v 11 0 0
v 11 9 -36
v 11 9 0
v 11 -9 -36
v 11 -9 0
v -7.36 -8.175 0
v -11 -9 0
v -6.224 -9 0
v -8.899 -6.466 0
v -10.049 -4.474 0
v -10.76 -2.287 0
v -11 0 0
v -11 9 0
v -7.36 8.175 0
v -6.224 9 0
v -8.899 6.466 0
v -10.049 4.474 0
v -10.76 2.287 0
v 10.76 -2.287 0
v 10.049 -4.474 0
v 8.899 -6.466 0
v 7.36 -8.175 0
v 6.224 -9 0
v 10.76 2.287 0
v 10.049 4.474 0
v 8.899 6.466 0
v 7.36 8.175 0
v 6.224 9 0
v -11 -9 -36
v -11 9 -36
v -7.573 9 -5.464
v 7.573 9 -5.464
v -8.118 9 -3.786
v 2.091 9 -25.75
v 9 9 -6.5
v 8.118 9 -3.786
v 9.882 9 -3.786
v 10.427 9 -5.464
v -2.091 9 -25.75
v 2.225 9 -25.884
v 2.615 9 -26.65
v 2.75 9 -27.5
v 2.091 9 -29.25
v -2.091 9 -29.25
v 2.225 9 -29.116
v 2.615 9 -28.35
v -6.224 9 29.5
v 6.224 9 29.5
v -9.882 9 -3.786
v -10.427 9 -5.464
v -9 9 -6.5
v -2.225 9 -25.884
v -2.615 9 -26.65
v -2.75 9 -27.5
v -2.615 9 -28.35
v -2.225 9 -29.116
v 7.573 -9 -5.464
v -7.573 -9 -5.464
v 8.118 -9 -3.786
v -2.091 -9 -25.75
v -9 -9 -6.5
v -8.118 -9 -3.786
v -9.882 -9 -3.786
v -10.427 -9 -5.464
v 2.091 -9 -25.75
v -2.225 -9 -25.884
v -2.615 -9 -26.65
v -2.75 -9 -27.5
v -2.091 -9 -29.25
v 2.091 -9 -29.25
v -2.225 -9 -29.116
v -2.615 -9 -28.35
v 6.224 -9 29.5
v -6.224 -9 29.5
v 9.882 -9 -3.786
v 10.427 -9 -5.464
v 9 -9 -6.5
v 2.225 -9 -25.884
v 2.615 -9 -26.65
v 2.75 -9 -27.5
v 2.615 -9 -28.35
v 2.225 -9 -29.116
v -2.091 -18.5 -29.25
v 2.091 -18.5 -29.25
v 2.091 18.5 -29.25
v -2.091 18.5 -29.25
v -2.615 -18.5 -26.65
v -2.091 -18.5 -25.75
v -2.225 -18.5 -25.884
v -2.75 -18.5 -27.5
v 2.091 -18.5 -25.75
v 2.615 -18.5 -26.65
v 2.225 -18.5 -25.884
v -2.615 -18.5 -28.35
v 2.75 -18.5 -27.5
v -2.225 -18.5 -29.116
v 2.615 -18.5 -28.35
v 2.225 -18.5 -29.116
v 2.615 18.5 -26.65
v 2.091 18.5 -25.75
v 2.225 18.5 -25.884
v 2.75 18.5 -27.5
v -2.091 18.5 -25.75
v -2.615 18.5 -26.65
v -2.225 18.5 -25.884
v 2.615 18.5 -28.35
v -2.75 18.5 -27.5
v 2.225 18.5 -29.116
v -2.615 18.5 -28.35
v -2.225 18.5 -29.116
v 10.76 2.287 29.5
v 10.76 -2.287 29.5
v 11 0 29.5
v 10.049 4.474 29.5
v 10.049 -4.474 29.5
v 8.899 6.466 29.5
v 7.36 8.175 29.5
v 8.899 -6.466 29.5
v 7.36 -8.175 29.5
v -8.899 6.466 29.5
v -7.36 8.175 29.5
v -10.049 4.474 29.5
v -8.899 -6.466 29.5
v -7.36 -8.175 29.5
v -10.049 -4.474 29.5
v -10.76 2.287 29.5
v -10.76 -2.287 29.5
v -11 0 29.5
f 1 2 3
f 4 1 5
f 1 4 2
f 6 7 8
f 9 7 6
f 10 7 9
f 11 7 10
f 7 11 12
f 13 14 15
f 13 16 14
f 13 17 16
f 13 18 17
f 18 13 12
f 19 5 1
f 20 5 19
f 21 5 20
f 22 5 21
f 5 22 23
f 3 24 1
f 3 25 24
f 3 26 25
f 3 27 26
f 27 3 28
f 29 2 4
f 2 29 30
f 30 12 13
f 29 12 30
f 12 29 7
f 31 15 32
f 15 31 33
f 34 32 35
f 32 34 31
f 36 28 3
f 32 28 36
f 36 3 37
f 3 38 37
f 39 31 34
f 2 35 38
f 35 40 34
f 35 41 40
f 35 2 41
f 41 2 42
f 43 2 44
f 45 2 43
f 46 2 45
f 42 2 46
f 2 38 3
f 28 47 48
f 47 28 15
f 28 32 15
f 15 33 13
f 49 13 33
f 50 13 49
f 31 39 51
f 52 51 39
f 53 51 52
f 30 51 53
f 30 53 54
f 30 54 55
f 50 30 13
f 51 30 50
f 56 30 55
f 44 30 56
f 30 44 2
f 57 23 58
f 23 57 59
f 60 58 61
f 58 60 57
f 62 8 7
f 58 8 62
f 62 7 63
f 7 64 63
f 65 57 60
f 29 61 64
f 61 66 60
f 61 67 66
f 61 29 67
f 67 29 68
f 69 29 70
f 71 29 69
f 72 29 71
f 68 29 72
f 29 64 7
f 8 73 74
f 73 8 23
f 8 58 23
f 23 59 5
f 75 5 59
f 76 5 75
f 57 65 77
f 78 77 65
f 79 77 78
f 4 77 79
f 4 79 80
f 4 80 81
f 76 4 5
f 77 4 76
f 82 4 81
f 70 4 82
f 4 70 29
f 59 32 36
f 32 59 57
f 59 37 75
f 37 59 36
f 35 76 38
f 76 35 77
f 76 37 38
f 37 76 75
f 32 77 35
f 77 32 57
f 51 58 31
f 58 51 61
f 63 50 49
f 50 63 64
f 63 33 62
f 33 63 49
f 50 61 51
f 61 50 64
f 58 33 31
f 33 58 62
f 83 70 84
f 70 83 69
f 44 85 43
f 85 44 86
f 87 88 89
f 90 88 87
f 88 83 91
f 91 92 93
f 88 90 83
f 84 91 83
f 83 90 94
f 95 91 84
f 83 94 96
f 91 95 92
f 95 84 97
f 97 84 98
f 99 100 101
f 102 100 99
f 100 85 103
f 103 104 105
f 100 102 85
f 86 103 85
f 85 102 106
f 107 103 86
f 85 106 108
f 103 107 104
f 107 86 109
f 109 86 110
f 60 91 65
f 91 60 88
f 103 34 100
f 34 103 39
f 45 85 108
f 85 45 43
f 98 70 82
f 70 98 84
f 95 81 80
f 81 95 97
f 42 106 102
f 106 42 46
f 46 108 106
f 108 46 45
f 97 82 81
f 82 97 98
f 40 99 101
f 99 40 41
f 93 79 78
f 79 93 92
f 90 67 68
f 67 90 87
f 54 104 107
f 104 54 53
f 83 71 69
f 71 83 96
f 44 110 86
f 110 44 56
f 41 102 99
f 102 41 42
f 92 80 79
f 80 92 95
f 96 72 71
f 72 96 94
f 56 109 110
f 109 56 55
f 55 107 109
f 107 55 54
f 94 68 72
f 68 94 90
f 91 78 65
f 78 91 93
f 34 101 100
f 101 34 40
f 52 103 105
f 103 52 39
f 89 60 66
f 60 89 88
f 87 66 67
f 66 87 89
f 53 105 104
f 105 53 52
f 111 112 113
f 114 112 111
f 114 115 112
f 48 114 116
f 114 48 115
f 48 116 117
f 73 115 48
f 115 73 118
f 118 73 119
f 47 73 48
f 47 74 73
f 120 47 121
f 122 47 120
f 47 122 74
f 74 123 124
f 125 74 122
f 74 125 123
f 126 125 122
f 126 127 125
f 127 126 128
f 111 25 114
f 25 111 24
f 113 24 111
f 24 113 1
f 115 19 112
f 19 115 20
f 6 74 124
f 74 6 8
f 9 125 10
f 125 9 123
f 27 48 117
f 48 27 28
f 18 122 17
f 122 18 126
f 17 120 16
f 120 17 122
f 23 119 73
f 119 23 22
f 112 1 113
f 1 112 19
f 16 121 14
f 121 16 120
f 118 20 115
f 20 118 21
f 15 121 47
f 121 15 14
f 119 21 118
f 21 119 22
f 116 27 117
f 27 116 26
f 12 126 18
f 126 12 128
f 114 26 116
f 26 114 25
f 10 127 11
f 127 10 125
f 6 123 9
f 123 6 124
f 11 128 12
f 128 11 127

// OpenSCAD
GearHousing=[22,18,36];
axle=[5.5,37];
axle_bottemOffset=8.5 - axle[0]/2;
motor=[22,18,29.5];
module Holes() {
 rotate([90,90,0]) 
    cylinder(d=3,h=GearHousing[1],center=true);

}
module GearHousing() {

   difference(){
 cube(GearHousing
, center=true);

translate([GearHousing[0]/2-2,0,GearHousing[2]/2-5])
    Holes();
translate([-1* GearHousing[0]/2+2,0,GearHousing[2]/2-5])
    Holes();

   }
 translate([0, 0,-1*(GearHousing[2]/2-axle_bottemOffset-axle[0]/2 )]) 
 rotate([90,90,0]) {
Axle();
 }

} 
module Axle(args) {
    intersection()
    {
        cube([3.5,axle[0],axle[1]],center=true);
  
  cylinder(d=axle[0], h=axle[1], center=true,$fn=20);    
    }   
}

module Motor() {
    intersection()
    {
        cube(motor,center=true);
        cylinder(d=motor[0],h=motor[2] ,center=true);
            
    }
} 

module Stack(ObjcetVector1,ObjcetVector2) {
    
translate([0, 0,-1*ObjcetVector1[2]/2])
    children(0);

translate([0, 0,  ObjcetVector2[2]/2]) 
    children(1);

}
Stack(GearHousing,motor)
{
GearHousing();

Motor();
}

//translate([0, 0,(GearHousing[2]/2+ motor[2]/2)]) 
  //      Motor(); 
